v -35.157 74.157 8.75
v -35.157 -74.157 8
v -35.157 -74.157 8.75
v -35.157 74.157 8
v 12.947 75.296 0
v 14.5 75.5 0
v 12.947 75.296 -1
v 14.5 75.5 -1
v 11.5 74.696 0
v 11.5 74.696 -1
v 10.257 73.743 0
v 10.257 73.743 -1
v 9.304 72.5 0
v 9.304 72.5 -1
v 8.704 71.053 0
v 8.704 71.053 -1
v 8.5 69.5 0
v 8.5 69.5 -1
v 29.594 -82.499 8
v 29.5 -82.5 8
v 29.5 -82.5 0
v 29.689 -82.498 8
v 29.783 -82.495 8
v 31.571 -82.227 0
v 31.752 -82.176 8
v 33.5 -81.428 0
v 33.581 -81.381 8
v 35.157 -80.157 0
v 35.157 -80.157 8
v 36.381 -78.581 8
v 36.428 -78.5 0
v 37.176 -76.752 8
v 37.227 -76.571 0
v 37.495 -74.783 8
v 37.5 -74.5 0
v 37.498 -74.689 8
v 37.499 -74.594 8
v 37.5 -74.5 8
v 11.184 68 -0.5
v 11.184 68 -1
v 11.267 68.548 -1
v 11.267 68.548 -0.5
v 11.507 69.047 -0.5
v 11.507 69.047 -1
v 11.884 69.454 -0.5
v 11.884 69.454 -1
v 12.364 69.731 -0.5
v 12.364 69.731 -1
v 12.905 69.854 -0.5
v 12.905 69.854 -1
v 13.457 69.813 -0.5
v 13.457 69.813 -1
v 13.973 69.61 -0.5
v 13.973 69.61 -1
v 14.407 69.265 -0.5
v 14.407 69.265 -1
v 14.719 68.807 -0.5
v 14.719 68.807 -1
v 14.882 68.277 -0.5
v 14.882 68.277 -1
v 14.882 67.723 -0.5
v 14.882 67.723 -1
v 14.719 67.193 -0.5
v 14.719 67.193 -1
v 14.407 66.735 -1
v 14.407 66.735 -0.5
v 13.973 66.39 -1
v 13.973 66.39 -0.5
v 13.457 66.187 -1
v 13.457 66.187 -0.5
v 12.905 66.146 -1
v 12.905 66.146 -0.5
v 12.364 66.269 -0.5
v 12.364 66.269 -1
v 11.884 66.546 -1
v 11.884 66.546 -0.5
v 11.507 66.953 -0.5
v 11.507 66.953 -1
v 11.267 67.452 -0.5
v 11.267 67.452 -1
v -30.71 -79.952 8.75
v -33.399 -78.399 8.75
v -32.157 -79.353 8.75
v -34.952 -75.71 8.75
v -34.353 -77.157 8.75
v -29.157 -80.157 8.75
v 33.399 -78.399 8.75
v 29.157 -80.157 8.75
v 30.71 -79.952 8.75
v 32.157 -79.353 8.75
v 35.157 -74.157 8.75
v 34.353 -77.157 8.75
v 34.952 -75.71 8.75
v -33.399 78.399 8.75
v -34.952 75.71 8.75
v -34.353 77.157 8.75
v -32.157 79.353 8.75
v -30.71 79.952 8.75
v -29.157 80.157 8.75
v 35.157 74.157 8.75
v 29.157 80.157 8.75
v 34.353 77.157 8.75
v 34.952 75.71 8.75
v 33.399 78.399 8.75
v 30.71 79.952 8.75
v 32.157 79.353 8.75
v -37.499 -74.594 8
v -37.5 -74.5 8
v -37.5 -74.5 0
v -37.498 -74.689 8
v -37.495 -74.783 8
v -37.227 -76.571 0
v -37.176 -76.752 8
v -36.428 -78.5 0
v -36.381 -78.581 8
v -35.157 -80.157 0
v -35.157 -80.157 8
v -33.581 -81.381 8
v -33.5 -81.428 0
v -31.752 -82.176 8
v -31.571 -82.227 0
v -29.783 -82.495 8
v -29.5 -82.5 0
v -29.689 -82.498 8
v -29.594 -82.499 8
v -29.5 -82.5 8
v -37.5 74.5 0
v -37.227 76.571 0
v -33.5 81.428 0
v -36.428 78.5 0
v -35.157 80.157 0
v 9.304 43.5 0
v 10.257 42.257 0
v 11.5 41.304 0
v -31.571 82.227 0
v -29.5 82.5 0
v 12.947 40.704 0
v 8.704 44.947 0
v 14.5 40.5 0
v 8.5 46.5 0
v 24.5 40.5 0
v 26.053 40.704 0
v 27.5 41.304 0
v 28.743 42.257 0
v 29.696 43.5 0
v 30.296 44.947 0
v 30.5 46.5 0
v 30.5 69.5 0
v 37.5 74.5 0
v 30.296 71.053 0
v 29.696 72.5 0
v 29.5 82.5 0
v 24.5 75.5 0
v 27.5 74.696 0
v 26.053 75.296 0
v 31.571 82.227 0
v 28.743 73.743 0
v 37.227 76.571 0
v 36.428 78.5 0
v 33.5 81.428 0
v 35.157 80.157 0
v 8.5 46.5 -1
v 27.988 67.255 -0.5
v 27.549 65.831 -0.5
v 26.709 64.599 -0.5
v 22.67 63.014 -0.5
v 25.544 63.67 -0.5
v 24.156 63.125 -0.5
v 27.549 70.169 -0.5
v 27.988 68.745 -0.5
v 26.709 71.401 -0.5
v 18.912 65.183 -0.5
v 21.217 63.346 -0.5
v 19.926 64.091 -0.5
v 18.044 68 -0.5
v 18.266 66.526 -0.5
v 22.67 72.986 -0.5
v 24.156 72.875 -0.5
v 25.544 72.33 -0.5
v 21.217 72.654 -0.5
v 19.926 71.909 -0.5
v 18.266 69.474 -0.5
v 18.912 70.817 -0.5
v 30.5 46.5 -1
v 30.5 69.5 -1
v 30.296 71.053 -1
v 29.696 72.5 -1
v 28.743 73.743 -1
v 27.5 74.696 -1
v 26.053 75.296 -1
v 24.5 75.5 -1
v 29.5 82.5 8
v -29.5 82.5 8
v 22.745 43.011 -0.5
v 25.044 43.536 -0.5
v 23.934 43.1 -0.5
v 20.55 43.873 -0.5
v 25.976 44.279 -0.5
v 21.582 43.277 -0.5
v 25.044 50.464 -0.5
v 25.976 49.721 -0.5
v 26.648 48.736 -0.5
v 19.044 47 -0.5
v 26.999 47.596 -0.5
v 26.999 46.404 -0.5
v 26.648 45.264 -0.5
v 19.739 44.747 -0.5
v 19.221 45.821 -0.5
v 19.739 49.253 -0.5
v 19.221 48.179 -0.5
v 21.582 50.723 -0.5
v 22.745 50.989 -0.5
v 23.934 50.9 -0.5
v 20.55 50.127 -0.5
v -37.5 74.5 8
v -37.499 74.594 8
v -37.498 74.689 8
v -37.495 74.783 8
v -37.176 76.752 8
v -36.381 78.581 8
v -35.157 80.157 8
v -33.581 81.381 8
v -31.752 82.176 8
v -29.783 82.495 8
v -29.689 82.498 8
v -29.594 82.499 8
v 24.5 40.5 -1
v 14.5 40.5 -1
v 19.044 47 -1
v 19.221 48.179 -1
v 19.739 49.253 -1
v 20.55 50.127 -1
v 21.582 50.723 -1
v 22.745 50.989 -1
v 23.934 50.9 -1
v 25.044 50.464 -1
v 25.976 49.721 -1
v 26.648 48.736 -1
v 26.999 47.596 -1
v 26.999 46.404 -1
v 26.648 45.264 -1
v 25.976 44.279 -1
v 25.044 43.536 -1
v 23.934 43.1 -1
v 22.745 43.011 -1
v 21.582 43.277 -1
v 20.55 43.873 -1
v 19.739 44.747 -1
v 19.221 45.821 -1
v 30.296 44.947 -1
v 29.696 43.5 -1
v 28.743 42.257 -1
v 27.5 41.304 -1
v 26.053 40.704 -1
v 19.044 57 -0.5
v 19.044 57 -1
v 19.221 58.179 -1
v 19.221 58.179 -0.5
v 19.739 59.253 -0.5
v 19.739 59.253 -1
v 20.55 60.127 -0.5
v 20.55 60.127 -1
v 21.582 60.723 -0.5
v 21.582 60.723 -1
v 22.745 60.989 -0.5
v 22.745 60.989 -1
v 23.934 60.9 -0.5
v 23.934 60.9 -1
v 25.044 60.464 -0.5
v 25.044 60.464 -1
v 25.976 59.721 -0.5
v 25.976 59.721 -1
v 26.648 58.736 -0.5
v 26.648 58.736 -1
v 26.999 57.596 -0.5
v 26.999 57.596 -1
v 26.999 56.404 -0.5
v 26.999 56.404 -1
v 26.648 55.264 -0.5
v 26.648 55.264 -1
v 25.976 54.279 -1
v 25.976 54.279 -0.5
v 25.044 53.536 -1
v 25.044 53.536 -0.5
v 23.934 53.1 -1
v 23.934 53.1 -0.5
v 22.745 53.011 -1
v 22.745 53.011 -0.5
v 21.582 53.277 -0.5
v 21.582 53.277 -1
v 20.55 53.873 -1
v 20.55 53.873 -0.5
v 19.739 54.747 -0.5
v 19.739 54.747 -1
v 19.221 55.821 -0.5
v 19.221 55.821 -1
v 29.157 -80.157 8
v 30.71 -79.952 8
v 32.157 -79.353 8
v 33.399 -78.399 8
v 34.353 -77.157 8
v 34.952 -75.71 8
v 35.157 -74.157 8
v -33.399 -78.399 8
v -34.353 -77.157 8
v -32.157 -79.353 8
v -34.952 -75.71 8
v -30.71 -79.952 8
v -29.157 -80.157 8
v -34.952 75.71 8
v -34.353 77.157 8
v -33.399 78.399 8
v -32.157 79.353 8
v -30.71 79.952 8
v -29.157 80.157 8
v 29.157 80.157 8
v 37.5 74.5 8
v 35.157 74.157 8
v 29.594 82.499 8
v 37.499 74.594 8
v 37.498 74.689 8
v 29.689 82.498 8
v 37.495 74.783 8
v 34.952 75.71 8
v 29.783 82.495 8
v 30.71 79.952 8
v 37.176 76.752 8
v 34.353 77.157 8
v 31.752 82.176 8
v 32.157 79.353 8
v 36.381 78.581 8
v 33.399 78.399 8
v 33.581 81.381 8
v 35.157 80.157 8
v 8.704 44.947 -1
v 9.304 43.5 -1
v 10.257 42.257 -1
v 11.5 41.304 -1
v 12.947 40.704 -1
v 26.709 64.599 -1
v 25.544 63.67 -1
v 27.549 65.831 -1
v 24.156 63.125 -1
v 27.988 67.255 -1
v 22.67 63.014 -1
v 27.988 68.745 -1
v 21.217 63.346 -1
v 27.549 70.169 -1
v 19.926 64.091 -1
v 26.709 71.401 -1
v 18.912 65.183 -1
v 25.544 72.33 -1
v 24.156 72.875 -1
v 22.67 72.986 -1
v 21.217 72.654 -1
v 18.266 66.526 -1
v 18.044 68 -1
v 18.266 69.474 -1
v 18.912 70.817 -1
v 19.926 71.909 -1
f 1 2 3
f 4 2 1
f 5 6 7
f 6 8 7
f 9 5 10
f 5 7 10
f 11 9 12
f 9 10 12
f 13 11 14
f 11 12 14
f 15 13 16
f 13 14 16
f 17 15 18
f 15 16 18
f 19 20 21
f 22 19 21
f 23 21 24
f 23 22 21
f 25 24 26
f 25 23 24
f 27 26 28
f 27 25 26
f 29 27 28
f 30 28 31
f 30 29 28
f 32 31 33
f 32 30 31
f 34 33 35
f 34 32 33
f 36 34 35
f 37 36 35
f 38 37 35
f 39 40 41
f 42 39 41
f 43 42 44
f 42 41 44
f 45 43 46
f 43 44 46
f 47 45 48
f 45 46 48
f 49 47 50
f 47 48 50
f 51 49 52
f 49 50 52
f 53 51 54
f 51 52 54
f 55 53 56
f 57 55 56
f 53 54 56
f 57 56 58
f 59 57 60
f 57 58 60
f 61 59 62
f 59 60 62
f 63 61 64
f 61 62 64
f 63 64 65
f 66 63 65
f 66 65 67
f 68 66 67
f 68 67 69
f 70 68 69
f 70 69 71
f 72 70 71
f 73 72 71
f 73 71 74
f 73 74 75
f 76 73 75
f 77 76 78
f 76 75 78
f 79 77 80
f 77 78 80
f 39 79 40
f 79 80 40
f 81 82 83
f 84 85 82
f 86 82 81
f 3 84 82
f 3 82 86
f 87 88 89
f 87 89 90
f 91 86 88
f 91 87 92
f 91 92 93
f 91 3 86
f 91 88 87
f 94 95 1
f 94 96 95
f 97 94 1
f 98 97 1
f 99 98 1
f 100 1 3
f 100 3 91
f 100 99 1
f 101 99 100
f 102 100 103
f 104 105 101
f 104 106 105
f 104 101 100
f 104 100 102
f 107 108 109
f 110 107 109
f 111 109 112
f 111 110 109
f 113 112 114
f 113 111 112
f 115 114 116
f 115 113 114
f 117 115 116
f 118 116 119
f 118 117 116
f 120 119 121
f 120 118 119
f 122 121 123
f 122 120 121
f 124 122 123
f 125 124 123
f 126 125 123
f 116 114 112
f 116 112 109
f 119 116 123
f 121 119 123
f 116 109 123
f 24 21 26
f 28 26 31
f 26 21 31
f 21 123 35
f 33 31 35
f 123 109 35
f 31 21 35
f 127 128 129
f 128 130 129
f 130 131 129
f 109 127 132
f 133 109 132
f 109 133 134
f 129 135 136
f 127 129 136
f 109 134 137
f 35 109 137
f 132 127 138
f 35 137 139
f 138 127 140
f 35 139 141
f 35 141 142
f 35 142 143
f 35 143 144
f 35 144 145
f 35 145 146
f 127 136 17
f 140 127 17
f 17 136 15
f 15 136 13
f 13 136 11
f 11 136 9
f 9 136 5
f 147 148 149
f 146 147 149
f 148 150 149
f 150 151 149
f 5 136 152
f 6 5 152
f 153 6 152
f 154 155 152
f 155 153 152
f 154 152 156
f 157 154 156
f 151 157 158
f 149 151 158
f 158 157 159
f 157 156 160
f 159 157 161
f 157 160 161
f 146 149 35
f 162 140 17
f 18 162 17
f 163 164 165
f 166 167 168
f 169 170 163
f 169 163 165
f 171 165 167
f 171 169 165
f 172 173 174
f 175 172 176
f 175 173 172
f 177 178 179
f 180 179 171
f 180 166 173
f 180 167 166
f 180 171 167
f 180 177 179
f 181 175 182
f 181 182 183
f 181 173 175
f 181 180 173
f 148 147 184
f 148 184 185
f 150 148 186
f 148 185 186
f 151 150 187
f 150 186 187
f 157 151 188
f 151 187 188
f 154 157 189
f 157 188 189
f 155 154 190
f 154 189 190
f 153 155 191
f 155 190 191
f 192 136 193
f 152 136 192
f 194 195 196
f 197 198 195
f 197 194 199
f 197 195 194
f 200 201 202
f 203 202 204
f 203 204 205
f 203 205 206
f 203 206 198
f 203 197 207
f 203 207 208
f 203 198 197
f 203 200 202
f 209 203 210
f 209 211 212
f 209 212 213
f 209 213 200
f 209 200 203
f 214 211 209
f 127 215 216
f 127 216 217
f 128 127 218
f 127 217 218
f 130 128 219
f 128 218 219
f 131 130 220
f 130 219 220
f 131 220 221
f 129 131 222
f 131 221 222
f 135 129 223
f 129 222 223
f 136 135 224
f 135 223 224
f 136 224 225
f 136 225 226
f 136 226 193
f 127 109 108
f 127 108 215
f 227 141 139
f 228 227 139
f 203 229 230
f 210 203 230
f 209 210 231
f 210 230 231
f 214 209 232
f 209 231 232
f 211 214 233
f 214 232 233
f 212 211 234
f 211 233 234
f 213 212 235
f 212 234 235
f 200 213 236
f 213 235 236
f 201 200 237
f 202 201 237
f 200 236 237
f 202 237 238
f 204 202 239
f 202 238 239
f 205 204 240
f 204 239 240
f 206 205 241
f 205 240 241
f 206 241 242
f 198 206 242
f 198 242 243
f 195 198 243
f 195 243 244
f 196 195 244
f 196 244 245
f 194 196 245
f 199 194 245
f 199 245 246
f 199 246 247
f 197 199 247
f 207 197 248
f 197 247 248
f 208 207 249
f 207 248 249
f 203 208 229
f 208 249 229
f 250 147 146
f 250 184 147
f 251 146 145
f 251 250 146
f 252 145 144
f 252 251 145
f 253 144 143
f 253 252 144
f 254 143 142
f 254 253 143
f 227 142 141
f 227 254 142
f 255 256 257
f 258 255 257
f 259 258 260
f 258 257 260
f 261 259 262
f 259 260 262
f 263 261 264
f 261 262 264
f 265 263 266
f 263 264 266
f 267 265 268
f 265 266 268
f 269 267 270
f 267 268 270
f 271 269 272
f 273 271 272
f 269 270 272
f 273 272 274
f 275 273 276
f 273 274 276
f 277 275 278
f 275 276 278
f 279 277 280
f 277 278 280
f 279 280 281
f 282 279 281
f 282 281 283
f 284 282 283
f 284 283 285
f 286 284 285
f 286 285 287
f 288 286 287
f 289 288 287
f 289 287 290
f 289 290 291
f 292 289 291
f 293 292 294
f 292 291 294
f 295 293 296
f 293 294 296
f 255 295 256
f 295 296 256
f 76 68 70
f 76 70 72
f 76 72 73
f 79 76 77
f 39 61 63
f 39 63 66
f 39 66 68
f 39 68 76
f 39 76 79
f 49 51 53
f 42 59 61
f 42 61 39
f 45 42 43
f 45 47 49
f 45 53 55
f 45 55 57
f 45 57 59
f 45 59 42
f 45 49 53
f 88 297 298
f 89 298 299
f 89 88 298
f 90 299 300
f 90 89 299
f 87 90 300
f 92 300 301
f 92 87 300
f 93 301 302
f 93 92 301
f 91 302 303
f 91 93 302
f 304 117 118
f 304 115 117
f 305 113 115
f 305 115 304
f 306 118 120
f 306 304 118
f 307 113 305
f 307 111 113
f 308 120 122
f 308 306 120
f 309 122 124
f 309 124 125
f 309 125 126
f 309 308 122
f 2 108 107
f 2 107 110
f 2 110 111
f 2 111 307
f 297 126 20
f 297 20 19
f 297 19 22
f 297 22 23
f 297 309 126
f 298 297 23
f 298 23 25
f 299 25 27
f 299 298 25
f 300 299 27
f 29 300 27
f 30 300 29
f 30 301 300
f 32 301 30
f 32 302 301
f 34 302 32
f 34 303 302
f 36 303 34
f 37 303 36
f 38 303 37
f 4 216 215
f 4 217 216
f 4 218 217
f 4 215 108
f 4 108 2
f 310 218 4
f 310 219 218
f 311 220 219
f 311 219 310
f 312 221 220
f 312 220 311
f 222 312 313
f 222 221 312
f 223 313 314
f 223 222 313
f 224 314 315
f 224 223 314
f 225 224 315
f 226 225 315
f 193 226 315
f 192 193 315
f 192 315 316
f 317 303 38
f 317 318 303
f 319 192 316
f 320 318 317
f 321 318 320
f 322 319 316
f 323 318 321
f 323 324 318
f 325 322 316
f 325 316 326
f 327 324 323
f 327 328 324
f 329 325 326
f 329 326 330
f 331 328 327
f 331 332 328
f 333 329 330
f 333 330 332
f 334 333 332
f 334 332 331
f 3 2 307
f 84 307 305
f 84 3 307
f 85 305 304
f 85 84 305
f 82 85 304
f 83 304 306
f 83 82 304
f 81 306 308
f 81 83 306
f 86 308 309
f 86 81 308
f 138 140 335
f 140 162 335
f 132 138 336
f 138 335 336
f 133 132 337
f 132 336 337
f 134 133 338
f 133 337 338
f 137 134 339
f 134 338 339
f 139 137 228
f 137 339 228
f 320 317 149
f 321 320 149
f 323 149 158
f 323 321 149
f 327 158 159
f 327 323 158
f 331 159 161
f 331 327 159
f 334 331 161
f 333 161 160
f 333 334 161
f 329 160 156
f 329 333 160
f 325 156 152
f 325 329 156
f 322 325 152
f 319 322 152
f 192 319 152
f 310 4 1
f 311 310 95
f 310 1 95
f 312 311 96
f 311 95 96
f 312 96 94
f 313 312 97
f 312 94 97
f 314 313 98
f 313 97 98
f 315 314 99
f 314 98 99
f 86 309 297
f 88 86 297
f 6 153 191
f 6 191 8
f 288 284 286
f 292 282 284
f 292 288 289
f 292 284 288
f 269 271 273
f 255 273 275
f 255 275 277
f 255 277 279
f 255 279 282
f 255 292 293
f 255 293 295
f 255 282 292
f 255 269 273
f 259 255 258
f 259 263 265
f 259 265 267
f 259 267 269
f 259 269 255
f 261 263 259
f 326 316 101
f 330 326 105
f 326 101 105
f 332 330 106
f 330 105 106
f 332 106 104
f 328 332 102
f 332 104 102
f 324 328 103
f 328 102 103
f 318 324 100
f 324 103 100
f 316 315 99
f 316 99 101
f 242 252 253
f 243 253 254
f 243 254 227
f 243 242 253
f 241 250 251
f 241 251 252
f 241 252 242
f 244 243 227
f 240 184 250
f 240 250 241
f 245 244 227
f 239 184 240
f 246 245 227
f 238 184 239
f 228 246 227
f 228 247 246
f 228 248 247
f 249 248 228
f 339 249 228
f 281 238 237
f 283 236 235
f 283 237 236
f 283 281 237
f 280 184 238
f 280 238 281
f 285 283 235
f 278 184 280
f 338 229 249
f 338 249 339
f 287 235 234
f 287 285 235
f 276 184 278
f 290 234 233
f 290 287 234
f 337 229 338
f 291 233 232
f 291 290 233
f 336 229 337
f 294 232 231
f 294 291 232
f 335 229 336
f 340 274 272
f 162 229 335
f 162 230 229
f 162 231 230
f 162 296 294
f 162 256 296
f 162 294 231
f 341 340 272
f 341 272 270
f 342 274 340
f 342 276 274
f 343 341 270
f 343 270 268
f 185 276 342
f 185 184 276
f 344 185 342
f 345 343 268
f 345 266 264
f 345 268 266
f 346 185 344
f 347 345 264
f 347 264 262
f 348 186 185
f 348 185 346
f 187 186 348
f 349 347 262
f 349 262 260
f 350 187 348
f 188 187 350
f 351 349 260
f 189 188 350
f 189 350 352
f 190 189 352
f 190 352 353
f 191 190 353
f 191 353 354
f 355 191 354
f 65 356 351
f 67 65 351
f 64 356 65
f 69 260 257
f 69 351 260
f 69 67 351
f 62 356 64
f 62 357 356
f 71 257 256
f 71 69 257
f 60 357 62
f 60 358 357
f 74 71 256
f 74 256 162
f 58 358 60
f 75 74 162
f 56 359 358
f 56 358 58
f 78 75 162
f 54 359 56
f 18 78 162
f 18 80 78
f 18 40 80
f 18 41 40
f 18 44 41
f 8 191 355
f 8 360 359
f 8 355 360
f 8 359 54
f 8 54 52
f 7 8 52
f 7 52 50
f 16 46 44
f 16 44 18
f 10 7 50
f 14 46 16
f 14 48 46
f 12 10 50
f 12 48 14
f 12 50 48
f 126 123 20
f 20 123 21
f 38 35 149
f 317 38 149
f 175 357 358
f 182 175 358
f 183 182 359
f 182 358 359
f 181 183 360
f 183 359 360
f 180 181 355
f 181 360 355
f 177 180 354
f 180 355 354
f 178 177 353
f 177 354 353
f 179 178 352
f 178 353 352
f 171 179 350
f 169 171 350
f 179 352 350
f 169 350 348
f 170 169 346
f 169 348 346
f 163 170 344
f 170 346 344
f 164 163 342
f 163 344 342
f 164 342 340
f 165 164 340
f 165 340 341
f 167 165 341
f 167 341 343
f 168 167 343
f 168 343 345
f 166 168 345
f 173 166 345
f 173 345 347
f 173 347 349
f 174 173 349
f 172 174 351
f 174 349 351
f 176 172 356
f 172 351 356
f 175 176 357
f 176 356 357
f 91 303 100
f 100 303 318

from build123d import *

# Parameters (mm, degrees)
SKETCH1_W           = 75
SKETCH1_H           = 165
BOSS_EXTRUDE1_DEPTH = 8
FILLET1_R           = 8
SKETCH2_W           = 22
SKETCH2_H           = 35
BOSS_EXTRUDE2_DEPTH = 1
FILLET2_R           = 6
SKETCH3_R           = 5
SKETCH3_R_2         = 4
SKETCH3_R_3         = 1.859320818
CUT_EXTRUDE1_DEPTH  = 0.5
SKETCH4_W           = 70.313708498
SKETCH4_H           = 160.313708498
BOSS_EXTRUDE3_DEPTH = 0.75
FILLET3_R           = 6


with BuildPart() as part:
    # Sketch1 → Boss-Extrude1 (new body)
    with BuildSketch(Plane.XY):
        Rectangle(SKETCH1_W, SKETCH1_H)
    extrude(amount=BOSS_EXTRUDE1_DEPTH)

    # Fillet1
    fillet1_edges = [part.edges().sort_by_distance(p)[0] for p in [
        (37.5, -82.5, 4),
        (-37.5, -82.5, 4),
        (-37.5, 82.5, 4),
        (37.5, 82.5, 4),
    ]]
    fillet(fillet1_edges, radius=FILLET1_R)

    # Sketch2 → Boss-Extrude2 (add)
    with BuildSketch(Plane(origin=(0, 0, 0), x_dir=(-1, 0, 0), z_dir=(0, 0, -1))):
        with Locations((-19.5, 58)):
            Rectangle(SKETCH2_W, SKETCH2_H)
    extrude(amount=BOSS_EXTRUDE2_DEPTH)

    # Fillet2
    fillet2_edges = [part.edges().sort_by_distance(p)[0] for p in [
        (8.5, 40.5, -0.5),
        (8.5, 75.5, -0.5),
        (30.5, 75.5, -0.5),
        (30.5, 40.5, -0.5),
    ]]
    fillet(fillet2_edges, radius=FILLET2_R)

    # Sketch3 → Cut-Extrude1 (cut)
    with BuildSketch(Plane(origin=(0, 0, -1), x_dir=(-1, 0, 0), z_dir=(0, 0, -1))):
        with Locations((-23.043680303, 68)):
            Circle(SKETCH3_R)
        with Locations((-23.043680303, 57)):
            Circle(SKETCH3_R_2)
        with Locations((-23.043680303, 47)):
            Circle(SKETCH3_R_2)
        with Locations((-13.043680303, 68)):
            Circle(SKETCH3_R_3)
    extrude(amount=-CUT_EXTRUDE1_DEPTH, mode=Mode.SUBTRACT)

    # Sketch4 → Boss-Extrude3 (add)
    with BuildSketch(Plane.XY.offset(8)):
        Rectangle(SKETCH4_W, SKETCH4_H)
    extrude(amount=BOSS_EXTRUDE3_DEPTH)

    # Fillet3
    fillet3_edges = [part.edges().sort_by_distance(p)[0] for p in [
        (-35.156854249, 80.156854249, 8.375),
        (-35.156854249, -80.156854249, 8.375),
        (35.156854249, -80.156854249, 8.375),
        (35.156854249, 80.156854249, 8.375),
    ]]
    fillet(fillet3_edges, radius=FILLET3_R)


solid = part.part
